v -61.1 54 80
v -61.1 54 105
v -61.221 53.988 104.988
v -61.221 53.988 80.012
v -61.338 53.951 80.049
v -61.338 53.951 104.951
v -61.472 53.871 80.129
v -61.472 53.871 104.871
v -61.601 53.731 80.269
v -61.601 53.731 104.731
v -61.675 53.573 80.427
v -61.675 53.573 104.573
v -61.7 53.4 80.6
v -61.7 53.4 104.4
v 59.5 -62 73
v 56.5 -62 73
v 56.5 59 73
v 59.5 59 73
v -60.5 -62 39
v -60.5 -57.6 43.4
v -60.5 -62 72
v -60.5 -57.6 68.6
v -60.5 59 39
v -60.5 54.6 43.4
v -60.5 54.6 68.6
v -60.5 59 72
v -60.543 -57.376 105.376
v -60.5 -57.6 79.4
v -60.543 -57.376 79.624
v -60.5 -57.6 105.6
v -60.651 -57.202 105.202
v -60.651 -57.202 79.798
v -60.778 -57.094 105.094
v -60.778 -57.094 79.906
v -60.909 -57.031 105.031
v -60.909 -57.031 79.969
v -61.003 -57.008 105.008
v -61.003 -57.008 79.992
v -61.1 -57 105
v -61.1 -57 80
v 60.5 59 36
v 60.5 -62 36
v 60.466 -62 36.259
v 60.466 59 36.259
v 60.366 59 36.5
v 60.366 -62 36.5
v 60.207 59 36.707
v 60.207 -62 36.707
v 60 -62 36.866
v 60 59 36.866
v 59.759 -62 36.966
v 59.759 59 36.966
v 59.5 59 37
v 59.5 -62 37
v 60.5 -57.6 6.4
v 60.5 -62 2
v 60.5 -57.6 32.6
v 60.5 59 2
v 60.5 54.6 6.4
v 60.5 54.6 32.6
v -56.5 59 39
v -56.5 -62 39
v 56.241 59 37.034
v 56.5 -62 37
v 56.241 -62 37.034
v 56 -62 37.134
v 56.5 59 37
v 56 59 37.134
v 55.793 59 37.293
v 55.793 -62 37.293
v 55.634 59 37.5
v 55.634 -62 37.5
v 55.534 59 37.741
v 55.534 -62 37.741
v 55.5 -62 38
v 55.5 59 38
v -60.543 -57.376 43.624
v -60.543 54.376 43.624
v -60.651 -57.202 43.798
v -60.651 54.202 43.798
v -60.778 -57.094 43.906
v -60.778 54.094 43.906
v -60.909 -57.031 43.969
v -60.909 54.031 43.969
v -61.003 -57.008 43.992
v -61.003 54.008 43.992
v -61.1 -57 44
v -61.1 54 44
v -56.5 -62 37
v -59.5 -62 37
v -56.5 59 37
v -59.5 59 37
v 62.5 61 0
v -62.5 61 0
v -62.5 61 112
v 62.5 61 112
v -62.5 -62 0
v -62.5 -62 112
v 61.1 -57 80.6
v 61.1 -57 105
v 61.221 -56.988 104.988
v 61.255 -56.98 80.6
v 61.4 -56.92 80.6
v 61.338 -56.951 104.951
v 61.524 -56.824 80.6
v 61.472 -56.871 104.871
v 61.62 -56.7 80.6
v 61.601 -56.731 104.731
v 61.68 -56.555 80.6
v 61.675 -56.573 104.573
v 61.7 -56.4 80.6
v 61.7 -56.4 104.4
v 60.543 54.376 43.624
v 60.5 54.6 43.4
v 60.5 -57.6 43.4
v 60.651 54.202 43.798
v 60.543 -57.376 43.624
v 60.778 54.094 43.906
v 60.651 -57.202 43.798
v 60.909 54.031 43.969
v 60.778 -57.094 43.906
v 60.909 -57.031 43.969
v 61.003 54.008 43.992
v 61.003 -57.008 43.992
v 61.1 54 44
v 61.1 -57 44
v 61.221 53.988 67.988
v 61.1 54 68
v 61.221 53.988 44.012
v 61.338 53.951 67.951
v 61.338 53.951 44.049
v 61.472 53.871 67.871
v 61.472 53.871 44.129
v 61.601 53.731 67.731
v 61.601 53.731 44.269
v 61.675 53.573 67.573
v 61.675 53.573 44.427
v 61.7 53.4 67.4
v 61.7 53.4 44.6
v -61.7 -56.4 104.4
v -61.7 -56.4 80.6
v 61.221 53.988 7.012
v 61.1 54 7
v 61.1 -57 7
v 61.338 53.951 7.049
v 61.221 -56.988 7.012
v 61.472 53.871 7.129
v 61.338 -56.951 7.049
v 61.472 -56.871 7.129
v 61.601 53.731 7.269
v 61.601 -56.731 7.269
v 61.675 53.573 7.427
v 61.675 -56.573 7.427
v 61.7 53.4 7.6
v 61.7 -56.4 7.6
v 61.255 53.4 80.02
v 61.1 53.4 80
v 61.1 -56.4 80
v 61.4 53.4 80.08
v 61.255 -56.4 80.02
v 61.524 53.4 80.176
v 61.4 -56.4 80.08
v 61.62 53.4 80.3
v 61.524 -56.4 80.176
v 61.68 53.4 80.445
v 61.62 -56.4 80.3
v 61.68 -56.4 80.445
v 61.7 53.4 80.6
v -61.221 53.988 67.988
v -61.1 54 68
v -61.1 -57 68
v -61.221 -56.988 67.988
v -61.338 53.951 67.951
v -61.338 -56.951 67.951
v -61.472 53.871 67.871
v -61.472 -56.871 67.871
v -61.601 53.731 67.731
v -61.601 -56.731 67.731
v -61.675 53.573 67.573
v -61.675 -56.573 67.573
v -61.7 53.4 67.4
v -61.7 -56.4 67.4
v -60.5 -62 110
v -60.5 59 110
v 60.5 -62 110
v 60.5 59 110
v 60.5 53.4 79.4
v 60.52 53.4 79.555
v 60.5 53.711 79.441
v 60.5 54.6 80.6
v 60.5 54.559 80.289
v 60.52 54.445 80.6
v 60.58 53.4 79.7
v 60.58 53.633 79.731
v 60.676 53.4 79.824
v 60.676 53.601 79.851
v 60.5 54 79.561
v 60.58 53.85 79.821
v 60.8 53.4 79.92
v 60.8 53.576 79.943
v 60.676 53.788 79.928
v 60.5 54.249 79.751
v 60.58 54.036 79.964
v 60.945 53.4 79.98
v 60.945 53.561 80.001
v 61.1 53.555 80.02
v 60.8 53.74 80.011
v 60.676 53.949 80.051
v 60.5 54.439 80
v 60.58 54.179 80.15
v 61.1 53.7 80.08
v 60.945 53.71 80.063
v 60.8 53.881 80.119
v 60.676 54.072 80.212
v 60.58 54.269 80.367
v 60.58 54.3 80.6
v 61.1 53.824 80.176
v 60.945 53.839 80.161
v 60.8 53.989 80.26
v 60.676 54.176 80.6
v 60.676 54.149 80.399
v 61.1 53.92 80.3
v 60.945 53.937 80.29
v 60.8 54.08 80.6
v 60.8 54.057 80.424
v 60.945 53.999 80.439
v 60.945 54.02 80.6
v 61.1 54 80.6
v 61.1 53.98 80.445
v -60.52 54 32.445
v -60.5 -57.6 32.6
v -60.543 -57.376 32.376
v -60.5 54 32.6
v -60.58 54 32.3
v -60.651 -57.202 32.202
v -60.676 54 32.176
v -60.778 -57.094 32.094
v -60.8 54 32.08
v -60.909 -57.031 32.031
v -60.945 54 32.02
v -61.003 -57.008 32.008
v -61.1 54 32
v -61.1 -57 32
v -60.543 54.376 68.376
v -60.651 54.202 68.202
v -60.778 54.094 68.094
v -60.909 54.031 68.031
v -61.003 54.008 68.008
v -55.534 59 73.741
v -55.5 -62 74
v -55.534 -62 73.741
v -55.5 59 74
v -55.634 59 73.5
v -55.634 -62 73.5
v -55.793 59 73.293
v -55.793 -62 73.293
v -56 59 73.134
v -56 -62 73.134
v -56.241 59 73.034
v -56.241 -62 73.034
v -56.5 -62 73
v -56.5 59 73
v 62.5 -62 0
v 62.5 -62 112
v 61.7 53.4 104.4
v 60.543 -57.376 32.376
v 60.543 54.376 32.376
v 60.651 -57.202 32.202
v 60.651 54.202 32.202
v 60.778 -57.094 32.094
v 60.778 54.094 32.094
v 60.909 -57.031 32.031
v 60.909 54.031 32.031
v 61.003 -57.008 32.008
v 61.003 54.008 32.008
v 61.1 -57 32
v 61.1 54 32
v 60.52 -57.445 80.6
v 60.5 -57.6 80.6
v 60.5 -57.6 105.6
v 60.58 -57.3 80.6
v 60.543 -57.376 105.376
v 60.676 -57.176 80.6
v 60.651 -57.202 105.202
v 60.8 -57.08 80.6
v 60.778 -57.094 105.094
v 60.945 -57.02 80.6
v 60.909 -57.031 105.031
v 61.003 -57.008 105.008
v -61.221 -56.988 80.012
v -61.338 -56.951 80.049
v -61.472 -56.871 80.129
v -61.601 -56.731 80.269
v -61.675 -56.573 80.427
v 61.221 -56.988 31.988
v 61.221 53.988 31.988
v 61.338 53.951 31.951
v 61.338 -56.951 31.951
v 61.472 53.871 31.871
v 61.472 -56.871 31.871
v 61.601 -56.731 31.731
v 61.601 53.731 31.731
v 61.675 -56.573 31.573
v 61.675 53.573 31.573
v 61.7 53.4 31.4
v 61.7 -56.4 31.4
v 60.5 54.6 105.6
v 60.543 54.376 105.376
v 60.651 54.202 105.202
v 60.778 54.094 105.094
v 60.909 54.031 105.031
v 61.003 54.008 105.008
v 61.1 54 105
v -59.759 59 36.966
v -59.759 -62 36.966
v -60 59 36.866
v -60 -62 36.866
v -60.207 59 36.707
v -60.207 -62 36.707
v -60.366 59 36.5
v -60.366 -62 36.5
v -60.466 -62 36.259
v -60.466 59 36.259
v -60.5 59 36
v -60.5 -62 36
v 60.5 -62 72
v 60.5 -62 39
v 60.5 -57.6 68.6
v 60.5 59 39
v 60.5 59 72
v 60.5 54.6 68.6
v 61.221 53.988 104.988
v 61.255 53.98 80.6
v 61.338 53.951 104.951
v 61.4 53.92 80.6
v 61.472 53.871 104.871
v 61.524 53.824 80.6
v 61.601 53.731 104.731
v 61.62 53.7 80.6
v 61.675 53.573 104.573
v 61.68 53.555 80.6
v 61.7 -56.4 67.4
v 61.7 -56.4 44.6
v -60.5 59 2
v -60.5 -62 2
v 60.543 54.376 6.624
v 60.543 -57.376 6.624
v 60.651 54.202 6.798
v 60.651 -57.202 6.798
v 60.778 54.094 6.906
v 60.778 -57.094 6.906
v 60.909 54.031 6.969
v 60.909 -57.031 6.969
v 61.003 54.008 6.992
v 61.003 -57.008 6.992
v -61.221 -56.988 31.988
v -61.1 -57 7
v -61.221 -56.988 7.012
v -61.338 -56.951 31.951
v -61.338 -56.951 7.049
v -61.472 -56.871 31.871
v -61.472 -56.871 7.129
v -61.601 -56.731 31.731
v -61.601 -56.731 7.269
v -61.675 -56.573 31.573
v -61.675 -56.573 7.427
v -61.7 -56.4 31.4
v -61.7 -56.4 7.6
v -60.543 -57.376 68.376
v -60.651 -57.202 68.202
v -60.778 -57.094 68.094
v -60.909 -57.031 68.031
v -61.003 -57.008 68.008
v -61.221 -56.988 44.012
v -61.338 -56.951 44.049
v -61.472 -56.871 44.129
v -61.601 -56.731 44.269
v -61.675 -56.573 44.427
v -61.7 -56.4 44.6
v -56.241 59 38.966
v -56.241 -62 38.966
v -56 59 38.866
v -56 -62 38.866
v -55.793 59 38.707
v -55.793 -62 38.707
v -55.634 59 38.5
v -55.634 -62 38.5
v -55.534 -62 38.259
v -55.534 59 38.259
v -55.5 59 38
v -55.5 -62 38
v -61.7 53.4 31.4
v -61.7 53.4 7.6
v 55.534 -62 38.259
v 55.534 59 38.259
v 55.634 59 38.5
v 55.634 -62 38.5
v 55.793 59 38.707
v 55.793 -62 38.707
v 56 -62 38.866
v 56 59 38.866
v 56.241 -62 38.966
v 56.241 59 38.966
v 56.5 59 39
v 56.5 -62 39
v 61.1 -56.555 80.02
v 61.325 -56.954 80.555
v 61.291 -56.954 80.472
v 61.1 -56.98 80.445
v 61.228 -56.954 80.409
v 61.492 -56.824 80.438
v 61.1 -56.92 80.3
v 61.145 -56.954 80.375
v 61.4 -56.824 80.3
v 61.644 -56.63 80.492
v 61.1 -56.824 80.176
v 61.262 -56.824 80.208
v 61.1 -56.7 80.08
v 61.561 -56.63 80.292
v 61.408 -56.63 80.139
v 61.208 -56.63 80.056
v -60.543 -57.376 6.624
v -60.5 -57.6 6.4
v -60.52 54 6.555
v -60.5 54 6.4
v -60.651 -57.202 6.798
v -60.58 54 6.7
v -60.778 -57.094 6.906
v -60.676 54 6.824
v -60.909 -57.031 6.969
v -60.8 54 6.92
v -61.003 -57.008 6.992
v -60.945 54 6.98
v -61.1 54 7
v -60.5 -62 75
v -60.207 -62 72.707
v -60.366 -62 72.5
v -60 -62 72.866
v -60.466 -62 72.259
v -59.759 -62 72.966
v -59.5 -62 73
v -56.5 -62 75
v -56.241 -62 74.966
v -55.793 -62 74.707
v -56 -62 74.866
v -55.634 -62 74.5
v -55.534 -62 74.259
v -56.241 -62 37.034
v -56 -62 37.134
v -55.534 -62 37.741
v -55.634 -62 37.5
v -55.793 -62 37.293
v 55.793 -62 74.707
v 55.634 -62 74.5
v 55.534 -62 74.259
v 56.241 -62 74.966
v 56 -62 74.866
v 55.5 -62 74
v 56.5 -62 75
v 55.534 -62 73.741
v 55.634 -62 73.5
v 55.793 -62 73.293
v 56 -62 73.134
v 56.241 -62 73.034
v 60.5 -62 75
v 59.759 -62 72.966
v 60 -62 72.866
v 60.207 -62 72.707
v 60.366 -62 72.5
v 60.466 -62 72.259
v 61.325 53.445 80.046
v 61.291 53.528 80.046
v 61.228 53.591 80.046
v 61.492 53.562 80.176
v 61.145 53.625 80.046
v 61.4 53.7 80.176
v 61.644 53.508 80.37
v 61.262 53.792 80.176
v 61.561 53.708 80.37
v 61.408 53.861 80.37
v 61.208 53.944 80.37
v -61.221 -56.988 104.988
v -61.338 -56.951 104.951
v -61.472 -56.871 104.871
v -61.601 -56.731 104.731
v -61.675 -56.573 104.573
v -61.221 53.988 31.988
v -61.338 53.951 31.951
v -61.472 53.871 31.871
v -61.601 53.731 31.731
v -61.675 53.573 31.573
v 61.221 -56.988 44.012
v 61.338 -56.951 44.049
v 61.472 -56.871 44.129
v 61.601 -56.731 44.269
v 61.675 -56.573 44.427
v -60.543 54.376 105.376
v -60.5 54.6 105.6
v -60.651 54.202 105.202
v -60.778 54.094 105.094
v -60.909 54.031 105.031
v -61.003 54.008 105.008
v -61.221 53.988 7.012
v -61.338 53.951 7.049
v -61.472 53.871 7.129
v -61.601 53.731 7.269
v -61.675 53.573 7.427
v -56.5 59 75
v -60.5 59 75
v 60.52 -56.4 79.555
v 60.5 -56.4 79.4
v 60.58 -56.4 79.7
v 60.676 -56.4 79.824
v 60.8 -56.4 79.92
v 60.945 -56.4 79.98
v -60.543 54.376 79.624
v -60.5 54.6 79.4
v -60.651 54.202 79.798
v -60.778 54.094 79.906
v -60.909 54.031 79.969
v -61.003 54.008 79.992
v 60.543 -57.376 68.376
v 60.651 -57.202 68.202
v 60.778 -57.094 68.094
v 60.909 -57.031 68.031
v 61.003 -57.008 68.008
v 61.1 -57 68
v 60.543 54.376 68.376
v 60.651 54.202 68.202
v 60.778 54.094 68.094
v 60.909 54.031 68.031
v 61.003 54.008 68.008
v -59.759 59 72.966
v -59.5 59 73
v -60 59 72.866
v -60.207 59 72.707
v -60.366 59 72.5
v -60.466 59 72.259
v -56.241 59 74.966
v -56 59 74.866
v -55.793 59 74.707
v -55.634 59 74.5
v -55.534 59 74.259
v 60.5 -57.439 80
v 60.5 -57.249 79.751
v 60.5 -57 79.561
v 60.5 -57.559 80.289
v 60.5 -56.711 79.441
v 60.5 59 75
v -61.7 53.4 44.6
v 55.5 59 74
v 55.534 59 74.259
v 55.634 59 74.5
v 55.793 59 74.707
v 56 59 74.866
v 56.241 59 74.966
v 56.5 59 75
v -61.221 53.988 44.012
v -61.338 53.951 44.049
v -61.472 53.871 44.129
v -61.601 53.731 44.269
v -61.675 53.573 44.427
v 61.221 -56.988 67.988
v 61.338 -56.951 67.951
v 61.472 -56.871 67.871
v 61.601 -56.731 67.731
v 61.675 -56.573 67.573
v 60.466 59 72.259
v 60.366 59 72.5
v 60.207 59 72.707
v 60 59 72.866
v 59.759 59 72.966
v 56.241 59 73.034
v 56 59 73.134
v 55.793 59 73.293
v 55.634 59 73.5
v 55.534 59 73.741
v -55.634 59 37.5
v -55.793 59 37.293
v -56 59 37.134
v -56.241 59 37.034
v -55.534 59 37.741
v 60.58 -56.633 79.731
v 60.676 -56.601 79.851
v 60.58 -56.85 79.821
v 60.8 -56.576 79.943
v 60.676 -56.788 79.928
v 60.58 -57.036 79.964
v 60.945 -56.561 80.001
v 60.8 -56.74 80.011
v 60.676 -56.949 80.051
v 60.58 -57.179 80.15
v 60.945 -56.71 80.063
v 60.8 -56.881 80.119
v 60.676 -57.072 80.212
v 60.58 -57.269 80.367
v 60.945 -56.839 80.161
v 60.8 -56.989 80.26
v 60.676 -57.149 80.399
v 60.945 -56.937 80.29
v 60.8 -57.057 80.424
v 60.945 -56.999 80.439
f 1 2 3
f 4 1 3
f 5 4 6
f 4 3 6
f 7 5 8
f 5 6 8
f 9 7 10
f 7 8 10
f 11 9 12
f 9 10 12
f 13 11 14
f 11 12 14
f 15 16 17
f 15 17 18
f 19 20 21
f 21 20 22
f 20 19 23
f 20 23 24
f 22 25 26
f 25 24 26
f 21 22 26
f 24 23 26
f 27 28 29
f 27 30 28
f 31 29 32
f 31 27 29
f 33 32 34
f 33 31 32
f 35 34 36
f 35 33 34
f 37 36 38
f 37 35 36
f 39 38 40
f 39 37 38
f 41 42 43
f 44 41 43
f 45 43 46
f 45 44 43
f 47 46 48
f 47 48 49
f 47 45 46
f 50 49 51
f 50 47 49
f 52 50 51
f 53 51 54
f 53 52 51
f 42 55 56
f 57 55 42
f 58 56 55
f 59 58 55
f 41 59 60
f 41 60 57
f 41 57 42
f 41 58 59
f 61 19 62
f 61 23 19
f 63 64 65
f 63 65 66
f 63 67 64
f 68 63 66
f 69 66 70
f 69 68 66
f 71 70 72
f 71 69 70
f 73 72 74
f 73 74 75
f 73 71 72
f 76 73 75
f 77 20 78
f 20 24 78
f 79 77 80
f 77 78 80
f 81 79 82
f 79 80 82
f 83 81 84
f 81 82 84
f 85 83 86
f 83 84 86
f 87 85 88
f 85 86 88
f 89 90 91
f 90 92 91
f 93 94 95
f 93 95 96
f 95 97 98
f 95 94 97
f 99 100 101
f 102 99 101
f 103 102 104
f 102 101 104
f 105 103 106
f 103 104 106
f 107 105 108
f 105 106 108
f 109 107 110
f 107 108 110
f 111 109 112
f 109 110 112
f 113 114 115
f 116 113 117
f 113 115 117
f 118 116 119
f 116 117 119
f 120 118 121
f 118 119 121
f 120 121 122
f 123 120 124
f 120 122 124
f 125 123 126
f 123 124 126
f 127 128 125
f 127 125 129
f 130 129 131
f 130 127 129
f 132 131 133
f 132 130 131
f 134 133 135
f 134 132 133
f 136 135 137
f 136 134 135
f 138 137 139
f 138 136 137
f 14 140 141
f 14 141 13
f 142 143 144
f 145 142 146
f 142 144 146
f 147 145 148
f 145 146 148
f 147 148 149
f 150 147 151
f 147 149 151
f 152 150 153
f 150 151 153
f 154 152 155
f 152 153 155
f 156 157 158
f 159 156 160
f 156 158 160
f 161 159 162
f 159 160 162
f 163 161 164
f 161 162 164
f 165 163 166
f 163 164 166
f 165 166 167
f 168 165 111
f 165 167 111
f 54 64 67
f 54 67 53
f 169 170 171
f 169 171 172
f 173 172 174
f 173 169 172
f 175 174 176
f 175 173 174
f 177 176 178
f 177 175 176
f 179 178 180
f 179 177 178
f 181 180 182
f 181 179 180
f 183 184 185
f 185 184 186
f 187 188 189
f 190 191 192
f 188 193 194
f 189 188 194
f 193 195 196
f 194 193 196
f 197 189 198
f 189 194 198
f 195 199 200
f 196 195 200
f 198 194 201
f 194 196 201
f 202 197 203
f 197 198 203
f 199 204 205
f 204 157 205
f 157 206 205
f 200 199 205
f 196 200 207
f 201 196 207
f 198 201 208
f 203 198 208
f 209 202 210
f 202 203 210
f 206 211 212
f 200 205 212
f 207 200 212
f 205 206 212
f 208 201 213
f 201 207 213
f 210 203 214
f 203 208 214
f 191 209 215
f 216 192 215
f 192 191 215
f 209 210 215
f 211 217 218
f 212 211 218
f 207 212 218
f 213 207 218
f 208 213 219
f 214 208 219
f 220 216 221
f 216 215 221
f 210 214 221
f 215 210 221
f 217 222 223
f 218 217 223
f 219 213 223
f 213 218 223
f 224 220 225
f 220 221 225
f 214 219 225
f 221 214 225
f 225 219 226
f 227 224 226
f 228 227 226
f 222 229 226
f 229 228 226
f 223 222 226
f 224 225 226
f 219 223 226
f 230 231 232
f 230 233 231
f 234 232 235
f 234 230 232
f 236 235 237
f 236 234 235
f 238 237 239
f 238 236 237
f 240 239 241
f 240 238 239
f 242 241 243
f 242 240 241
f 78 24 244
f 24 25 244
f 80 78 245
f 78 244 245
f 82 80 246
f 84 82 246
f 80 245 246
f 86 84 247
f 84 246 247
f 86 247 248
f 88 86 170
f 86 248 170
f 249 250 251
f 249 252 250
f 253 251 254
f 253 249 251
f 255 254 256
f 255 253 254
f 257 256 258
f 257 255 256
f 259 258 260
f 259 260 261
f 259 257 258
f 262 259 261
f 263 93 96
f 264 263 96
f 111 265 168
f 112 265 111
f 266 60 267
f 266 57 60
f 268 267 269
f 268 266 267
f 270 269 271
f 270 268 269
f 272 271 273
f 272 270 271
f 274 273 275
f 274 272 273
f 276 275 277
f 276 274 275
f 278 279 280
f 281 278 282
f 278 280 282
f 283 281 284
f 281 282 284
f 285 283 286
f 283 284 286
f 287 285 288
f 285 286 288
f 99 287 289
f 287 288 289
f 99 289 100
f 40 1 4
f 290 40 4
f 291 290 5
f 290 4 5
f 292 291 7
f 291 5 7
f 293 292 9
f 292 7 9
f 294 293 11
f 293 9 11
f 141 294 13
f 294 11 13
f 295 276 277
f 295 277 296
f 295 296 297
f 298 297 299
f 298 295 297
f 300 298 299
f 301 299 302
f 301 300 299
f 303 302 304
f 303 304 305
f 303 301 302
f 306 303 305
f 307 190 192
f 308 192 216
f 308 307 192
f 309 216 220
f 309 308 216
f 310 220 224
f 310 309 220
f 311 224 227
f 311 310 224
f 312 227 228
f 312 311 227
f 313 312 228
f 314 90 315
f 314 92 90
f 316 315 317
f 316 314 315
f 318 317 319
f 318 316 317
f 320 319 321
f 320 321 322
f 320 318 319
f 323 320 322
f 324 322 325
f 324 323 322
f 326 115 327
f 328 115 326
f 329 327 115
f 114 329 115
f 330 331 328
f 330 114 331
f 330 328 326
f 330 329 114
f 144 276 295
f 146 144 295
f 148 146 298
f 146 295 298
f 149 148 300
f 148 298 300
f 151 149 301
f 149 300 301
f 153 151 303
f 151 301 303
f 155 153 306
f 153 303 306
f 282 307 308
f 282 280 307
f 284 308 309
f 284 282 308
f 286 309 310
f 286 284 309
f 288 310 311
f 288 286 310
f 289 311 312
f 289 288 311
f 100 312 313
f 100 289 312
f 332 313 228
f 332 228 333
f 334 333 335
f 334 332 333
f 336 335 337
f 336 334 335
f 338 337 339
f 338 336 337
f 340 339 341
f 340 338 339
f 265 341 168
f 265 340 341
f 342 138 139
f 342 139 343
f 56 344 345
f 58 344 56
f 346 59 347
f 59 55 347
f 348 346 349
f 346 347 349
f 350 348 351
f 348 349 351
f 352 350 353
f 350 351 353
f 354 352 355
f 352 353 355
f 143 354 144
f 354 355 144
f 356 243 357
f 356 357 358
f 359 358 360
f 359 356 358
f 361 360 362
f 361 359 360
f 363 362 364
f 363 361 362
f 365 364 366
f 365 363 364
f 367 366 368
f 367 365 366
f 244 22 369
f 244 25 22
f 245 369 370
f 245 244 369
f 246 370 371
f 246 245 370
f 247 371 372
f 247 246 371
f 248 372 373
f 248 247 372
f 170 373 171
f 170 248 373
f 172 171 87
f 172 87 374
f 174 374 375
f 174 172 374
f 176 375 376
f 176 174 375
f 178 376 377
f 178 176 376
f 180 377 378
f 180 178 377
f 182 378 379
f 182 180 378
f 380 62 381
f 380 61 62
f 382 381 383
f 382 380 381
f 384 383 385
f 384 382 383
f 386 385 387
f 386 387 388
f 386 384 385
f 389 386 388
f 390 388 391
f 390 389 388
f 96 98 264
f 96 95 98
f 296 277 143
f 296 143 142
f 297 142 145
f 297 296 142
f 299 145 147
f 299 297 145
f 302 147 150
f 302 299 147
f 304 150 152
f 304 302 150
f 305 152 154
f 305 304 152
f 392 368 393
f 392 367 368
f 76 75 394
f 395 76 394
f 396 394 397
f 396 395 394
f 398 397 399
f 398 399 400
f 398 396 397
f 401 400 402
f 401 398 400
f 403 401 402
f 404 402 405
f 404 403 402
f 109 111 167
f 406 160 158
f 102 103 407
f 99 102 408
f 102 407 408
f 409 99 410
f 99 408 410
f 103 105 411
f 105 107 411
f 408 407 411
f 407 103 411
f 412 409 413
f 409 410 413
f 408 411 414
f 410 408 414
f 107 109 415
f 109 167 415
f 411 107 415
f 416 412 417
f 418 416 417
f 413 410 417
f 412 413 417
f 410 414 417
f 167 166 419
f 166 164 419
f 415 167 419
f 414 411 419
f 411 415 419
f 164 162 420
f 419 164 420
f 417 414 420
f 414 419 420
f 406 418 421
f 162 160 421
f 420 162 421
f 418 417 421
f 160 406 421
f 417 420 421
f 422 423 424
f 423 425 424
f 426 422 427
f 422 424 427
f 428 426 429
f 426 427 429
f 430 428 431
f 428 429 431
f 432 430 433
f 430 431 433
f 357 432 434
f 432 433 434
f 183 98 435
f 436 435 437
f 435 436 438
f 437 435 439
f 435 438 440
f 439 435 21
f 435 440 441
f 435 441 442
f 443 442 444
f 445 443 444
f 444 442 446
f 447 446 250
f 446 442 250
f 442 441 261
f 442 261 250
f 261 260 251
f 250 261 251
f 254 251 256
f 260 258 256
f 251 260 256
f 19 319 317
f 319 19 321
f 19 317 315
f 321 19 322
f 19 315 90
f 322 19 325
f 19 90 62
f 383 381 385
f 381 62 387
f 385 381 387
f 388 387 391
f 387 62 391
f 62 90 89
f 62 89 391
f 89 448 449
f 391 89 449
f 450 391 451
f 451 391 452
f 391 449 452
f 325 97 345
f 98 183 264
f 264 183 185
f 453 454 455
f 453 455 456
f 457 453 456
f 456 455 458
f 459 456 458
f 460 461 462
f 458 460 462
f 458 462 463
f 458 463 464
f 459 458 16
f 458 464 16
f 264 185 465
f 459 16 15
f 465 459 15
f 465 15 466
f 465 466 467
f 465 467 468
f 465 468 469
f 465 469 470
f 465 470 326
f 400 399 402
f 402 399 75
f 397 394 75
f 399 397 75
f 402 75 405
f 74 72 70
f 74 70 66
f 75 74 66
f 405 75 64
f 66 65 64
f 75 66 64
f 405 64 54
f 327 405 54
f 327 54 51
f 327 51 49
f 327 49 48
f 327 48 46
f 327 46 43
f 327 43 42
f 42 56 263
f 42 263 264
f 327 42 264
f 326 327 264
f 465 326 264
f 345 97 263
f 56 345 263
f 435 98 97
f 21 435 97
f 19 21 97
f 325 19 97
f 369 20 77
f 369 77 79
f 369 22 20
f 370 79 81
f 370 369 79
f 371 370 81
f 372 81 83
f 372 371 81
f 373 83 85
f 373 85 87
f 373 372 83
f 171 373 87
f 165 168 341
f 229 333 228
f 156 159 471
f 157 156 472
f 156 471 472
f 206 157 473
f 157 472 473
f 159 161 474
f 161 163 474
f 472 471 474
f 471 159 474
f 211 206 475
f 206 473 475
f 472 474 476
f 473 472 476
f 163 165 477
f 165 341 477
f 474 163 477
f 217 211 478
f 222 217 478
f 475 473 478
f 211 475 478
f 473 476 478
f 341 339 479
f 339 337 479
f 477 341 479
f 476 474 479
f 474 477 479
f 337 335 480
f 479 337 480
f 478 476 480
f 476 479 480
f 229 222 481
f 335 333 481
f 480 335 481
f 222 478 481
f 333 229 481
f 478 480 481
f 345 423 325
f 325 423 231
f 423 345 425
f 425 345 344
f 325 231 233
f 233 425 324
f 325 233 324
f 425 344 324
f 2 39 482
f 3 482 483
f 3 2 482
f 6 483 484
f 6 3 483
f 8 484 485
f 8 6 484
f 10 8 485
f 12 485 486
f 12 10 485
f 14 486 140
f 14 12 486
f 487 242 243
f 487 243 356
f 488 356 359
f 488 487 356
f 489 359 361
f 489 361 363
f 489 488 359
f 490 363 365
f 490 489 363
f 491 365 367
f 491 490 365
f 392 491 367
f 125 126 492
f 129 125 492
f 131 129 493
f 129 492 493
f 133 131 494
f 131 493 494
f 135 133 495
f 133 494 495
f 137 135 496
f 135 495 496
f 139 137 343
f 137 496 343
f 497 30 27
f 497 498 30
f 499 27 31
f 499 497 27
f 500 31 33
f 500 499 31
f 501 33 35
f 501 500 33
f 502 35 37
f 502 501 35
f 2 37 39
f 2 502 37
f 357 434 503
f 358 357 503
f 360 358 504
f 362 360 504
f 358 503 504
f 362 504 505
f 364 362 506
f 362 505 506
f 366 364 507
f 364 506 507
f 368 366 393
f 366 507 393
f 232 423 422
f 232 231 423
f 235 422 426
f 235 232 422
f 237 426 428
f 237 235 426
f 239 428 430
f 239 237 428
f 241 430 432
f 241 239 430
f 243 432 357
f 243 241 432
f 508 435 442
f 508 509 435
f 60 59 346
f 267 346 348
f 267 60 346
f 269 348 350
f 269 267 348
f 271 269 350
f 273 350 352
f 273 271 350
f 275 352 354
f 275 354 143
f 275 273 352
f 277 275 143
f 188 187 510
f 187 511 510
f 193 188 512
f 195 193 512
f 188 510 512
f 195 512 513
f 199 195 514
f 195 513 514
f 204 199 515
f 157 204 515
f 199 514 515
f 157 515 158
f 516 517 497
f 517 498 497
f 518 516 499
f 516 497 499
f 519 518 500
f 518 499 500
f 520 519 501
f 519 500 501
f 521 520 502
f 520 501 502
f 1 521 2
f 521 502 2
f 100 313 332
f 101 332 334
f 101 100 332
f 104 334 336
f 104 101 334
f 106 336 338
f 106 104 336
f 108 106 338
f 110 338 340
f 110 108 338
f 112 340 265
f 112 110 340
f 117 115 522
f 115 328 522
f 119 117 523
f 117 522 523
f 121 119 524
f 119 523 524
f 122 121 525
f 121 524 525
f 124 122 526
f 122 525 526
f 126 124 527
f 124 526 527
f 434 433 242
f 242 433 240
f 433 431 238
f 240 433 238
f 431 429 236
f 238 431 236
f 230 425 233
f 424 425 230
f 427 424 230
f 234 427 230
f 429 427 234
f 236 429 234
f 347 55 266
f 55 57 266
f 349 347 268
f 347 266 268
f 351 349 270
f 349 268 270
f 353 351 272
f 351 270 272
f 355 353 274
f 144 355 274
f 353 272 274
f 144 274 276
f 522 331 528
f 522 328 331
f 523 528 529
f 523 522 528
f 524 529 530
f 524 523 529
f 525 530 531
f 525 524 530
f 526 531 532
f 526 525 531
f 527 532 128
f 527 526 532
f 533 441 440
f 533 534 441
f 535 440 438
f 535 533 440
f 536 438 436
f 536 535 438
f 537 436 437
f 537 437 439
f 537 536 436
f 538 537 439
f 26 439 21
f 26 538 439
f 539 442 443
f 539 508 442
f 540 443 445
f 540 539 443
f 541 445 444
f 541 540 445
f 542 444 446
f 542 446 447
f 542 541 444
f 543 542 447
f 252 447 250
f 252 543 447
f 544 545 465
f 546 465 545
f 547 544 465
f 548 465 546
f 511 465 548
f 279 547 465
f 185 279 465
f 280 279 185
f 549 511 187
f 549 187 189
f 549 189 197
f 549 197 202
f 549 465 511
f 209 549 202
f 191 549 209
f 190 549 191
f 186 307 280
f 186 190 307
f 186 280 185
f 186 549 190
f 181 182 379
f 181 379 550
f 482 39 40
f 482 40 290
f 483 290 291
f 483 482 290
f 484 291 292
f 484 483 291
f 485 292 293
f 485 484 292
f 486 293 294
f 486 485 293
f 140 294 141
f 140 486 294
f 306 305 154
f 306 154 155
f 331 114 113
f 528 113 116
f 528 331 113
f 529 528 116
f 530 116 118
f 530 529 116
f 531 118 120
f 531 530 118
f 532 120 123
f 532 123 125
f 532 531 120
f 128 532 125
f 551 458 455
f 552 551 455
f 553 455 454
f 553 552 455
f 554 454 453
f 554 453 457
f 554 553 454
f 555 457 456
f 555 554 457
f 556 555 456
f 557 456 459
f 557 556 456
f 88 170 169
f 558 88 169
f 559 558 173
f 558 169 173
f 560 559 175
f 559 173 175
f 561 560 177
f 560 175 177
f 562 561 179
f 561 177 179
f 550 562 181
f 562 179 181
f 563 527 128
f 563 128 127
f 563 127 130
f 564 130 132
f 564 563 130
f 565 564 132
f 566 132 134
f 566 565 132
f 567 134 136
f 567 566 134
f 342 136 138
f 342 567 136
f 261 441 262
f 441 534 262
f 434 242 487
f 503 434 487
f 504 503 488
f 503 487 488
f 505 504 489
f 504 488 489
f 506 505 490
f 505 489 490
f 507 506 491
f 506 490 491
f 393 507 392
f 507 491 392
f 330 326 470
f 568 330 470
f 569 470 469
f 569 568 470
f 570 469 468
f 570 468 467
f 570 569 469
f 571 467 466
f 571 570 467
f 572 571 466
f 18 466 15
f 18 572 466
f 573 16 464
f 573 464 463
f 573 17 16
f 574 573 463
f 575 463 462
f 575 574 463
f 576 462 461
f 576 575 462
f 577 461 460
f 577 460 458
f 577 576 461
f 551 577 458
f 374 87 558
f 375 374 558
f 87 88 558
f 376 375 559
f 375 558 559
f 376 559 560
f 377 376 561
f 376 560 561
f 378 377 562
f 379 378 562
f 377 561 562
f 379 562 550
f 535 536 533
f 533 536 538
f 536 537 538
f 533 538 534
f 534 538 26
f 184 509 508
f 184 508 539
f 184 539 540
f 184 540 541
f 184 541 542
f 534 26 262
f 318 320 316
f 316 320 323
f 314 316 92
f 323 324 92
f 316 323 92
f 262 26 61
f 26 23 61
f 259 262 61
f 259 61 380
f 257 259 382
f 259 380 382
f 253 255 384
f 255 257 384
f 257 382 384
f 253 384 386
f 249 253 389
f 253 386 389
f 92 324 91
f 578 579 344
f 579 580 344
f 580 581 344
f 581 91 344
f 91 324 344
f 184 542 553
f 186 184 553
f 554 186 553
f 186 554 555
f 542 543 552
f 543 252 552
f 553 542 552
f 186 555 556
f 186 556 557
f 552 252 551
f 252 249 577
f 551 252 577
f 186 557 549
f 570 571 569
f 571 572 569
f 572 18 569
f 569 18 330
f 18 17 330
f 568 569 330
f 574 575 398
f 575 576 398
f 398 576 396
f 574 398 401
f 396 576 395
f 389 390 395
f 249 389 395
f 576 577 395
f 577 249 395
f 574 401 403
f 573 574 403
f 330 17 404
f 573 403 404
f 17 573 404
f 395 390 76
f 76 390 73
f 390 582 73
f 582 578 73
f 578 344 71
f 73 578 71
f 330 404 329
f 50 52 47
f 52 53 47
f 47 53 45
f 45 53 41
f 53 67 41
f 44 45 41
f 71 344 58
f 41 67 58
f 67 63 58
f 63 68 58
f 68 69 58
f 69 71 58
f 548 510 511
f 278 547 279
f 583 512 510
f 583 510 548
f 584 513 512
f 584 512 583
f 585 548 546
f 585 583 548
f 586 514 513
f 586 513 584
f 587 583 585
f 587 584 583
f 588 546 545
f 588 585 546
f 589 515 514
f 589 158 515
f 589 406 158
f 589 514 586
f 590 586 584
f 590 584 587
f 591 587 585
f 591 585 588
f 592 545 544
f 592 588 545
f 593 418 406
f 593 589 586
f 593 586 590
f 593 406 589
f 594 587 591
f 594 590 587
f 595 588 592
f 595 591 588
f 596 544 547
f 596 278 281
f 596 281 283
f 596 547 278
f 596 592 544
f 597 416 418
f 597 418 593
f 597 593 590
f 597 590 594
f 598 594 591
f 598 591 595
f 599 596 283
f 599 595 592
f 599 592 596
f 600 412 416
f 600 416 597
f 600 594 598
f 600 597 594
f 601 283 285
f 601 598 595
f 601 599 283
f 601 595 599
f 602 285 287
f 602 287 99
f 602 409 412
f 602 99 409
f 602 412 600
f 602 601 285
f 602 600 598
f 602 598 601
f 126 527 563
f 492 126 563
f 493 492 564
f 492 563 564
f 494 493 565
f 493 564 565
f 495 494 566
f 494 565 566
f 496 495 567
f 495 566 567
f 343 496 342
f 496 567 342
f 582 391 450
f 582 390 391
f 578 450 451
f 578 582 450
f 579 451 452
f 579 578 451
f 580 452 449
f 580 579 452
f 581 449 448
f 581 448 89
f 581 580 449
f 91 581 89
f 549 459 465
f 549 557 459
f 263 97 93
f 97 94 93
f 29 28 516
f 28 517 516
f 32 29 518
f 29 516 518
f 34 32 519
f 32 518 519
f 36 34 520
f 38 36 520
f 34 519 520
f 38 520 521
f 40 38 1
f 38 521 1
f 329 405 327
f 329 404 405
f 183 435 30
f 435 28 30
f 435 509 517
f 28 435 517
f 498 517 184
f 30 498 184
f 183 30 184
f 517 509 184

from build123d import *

# Parameters (mm, degrees)
F0_W      = 125
F0_H      = 122
F1_DEPTH  = 2
F2_W      = 121
F2_H      = 2
F2_W_2    = 2
F2_H_2    = 120
F3_DEPTH  = 108
F4_W      = 125
F4_H      = 122
F5_DEPTH  = 2
F6_W      = 4.9999992847
F6_H      = 1
F6_W_2    = 5
F7_DEPTH  = 120
F8_DEPTH  = 1
F9_W      = 111
F9_H      = 25
F9_W_2    = 111.000007391
F9_H_2    = 24.000007391
F9_W_3    = 111.0000030398
F9_H_3    = 25.0000030398
F11_DEPTH = 1.2
F10_W     = 111
F10_H     = 25
F10_H_2   = 24
F12_DEPTH = 1.2
F13_R     = 0.99999
F14_R     = 0.59999


# Not quite as in the source:
# - a fillet or chamfer is up to 0.001 mm smaller than in the source, because OpenCascade refuses the exact size
# - a feature names something its author has since deleted; it is built from what else it names


with BuildPart() as f1:
    # F0 (on Top) → F1 (new body)
    with BuildSketch(Plane.XY):
        Rectangle(F0_W, F0_H)
    extrude(amount=F1_DEPTH)

    # F2 (on face) → F3 (join)
    with BuildSketch(Plane.XY.offset(2)):
        with Locations((0, 60)):
            Rectangle(F2_W, F2_H)
        with Locations((-61.5, 60)):
            Rectangle(F2_W_2, F2_H)
        with Locations((-61.5, -1)):
            Rectangle(F2_W_2, F2_H_2)
        with Locations((61.5, -1)):
            Rectangle(F2_W_2, F2_H_2)
        with Locations((61.5, 60)):
            Rectangle(F2_W_2, F2_H)
    extrude(amount=F3_DEPTH)

    # F4 (on face) → F5 (join)
    with BuildSketch(Plane.XY.offset(110)):
        Rectangle(F4_W, F4_H)
    extrude(amount=F5_DEPTH)

    # F6 (on face) → F7 (join)
    with BuildSketch(Plane.XZ.offset(61)):
        with Locations((-58.0000003576, 74.5)):
            Rectangle(F6_W, F6_H)
        with Locations((-58.0000003576, 73.5)):
            Rectangle(F6_W, F6_H)
        with Locations((-58.0000003576, 38.5)):
            Rectangle(F6_W, F6_H)
        with Locations((-58.0000003576, 37.5)):
            Rectangle(F6_W, F6_H)
        with Locations((58, 74.5)):
            Rectangle(F6_W_2, F6_H)
        with Locations((58, 73.5)):
            Rectangle(F6_W_2, F6_H)
        with Locations((58, 38.5)):
            Rectangle(F6_W_2, F6_H)
        with Locations((58, 37.5)):
            Rectangle(F6_W_2, F6_H)
    extrude(amount=-F7_DEPTH)

    # F8 (add): a face of the model
    f8_faces = [f1.faces().sort_by_distance(p)[0] for p in [
        (-60.821637703, -61, 56),
    ]]
    extrude(f8_faces, amount=F8_DEPTH)

    # F9 (on face) → F11 (cut)
    with BuildSketch(Plane.YZ.offset(-60.5)):
        with Locations((-1.5, 92.5)):
            Rectangle(F9_W, F9_H)
        with Locations((-1.5, 56)):
            Rectangle(F9_W_2, F9_H_2)
        with Locations((-1.5, 19.5)):
            Rectangle(F9_W_3, F9_H_3)
    extrude(amount=-F11_DEPTH, mode=Mode.SUBTRACT)

    # F10 (on face) → F12 (cut)
    with BuildSketch(Plane(origin=(60.5, 0, 0), x_dir=(0, -1, 0), z_dir=(-1, 0, 0))):
        with Locations((1.5, 92.5)):
            Rectangle(F10_W, F10_H)
        with Locations((1.5, 56)):
            Rectangle(F10_W, F10_H_2)
        with Locations((1.5, 19.5)):
            Rectangle(F10_W, F10_H)
    extrude(amount=-F12_DEPTH, mode=Mode.SUBTRACT)

    # F13 (radius 1 in the source; OpenCascade refuses exactly that, so slightly less here)
    f13_edges = [f1.edges().sort_by_distance(p)[0] for p in [
        (55.5, -1.5, 75),
        (55.5, -1.5, 73),
        (55.5, -1.5, 39),
        (55.5, -1.5, 37),
        (-55.500001, -1.5, 75),
        (-55.500001, -1.5, 73),
        (-55.500001, -1.5, 39),
        (-55.500001, -1.5, 37),
        (-60.5, -1.5, 73),
        (-60.5, -1.5, 37),
        (60.5, -1.5, 73),
        (60.5, -1.5, 37),
    ]]
    fillet(f13_edges, radius=F13_R)

    # F14 (radius 0.6 in the source; OpenCascade refuses exactly that, so slightly less here)
    f14_edges = [f1.edges().sort_by_distance(p)[0] for p in [
        (-61.7, 54, 92.5),
        (-61.7, -1.5, 105),
        (-61.7, -57, 92.5),
        (-61.7, -1.5, 80),
        (-60.5, -1.5, 80),
        (-60.5, -57, 92.5),
        (-60.5, -1.5, 105),
        (-60.5, 54, 92.5),
        (-61.7, 54.000004, 56),
        (-61.7, -1.5, 68.000004),
        (-61.7, -57.000004, 56),
        (-61.7, -1.5, 43.999996),
        (-60.5, -1.5, 68.000004),
        (-60.5, -57.000004, 56),
        (-60.5, 54.000004, 56),
        (-60.5, -1.5, 43.999996),
        (-61.7, -1.5, 6.999998),
        (-61.7, 54.000002, 19.5),
        (-61.7, -1.5, 32.000002),
        (-61.7, -57.000002, 19.5),
        (-60.5, -1.5, 32.000002),
        (-60.5, -57.000002, 19.5),
        (-60.5, -1.5, 6.999998),
        (61.7, -57, 19.5),
        (61.7, -1.5, 32),
        (61.7, 54, 19.5),
        (61.7, -1.5, 7),
        (61.7, -1.5, 68),
        (61.7, 54, 56),
        (61.7, -1.5, 44),
        (61.7, -57, 56),
        (61.7, -1.5, 105),
        (61.7, 54, 92.5),
        (61.7, -1.5, 80),
        (61.7, -57, 92.5),
        (60.5, -1.5, 105),
        (60.5, 54, 92.5),
        (60.5, -57, 92.5),
        (61.1, 54, 80),
        (61.1, -57, 80),
        (60.5, -1.5, 80),
        (60.5, -1.5, 68),
        (60.5, -57, 56),
        (60.5, 54, 56),
        (60.5, -1.5, 44),
        (60.5, 54, 19.5),
        (60.5, -1.5, 32),
        (60.5, -1.5, 7),
        (60.5, -57, 19.5),
    ]]
    fillet(f14_edges, radius=F14_R)


solid = f1.part
